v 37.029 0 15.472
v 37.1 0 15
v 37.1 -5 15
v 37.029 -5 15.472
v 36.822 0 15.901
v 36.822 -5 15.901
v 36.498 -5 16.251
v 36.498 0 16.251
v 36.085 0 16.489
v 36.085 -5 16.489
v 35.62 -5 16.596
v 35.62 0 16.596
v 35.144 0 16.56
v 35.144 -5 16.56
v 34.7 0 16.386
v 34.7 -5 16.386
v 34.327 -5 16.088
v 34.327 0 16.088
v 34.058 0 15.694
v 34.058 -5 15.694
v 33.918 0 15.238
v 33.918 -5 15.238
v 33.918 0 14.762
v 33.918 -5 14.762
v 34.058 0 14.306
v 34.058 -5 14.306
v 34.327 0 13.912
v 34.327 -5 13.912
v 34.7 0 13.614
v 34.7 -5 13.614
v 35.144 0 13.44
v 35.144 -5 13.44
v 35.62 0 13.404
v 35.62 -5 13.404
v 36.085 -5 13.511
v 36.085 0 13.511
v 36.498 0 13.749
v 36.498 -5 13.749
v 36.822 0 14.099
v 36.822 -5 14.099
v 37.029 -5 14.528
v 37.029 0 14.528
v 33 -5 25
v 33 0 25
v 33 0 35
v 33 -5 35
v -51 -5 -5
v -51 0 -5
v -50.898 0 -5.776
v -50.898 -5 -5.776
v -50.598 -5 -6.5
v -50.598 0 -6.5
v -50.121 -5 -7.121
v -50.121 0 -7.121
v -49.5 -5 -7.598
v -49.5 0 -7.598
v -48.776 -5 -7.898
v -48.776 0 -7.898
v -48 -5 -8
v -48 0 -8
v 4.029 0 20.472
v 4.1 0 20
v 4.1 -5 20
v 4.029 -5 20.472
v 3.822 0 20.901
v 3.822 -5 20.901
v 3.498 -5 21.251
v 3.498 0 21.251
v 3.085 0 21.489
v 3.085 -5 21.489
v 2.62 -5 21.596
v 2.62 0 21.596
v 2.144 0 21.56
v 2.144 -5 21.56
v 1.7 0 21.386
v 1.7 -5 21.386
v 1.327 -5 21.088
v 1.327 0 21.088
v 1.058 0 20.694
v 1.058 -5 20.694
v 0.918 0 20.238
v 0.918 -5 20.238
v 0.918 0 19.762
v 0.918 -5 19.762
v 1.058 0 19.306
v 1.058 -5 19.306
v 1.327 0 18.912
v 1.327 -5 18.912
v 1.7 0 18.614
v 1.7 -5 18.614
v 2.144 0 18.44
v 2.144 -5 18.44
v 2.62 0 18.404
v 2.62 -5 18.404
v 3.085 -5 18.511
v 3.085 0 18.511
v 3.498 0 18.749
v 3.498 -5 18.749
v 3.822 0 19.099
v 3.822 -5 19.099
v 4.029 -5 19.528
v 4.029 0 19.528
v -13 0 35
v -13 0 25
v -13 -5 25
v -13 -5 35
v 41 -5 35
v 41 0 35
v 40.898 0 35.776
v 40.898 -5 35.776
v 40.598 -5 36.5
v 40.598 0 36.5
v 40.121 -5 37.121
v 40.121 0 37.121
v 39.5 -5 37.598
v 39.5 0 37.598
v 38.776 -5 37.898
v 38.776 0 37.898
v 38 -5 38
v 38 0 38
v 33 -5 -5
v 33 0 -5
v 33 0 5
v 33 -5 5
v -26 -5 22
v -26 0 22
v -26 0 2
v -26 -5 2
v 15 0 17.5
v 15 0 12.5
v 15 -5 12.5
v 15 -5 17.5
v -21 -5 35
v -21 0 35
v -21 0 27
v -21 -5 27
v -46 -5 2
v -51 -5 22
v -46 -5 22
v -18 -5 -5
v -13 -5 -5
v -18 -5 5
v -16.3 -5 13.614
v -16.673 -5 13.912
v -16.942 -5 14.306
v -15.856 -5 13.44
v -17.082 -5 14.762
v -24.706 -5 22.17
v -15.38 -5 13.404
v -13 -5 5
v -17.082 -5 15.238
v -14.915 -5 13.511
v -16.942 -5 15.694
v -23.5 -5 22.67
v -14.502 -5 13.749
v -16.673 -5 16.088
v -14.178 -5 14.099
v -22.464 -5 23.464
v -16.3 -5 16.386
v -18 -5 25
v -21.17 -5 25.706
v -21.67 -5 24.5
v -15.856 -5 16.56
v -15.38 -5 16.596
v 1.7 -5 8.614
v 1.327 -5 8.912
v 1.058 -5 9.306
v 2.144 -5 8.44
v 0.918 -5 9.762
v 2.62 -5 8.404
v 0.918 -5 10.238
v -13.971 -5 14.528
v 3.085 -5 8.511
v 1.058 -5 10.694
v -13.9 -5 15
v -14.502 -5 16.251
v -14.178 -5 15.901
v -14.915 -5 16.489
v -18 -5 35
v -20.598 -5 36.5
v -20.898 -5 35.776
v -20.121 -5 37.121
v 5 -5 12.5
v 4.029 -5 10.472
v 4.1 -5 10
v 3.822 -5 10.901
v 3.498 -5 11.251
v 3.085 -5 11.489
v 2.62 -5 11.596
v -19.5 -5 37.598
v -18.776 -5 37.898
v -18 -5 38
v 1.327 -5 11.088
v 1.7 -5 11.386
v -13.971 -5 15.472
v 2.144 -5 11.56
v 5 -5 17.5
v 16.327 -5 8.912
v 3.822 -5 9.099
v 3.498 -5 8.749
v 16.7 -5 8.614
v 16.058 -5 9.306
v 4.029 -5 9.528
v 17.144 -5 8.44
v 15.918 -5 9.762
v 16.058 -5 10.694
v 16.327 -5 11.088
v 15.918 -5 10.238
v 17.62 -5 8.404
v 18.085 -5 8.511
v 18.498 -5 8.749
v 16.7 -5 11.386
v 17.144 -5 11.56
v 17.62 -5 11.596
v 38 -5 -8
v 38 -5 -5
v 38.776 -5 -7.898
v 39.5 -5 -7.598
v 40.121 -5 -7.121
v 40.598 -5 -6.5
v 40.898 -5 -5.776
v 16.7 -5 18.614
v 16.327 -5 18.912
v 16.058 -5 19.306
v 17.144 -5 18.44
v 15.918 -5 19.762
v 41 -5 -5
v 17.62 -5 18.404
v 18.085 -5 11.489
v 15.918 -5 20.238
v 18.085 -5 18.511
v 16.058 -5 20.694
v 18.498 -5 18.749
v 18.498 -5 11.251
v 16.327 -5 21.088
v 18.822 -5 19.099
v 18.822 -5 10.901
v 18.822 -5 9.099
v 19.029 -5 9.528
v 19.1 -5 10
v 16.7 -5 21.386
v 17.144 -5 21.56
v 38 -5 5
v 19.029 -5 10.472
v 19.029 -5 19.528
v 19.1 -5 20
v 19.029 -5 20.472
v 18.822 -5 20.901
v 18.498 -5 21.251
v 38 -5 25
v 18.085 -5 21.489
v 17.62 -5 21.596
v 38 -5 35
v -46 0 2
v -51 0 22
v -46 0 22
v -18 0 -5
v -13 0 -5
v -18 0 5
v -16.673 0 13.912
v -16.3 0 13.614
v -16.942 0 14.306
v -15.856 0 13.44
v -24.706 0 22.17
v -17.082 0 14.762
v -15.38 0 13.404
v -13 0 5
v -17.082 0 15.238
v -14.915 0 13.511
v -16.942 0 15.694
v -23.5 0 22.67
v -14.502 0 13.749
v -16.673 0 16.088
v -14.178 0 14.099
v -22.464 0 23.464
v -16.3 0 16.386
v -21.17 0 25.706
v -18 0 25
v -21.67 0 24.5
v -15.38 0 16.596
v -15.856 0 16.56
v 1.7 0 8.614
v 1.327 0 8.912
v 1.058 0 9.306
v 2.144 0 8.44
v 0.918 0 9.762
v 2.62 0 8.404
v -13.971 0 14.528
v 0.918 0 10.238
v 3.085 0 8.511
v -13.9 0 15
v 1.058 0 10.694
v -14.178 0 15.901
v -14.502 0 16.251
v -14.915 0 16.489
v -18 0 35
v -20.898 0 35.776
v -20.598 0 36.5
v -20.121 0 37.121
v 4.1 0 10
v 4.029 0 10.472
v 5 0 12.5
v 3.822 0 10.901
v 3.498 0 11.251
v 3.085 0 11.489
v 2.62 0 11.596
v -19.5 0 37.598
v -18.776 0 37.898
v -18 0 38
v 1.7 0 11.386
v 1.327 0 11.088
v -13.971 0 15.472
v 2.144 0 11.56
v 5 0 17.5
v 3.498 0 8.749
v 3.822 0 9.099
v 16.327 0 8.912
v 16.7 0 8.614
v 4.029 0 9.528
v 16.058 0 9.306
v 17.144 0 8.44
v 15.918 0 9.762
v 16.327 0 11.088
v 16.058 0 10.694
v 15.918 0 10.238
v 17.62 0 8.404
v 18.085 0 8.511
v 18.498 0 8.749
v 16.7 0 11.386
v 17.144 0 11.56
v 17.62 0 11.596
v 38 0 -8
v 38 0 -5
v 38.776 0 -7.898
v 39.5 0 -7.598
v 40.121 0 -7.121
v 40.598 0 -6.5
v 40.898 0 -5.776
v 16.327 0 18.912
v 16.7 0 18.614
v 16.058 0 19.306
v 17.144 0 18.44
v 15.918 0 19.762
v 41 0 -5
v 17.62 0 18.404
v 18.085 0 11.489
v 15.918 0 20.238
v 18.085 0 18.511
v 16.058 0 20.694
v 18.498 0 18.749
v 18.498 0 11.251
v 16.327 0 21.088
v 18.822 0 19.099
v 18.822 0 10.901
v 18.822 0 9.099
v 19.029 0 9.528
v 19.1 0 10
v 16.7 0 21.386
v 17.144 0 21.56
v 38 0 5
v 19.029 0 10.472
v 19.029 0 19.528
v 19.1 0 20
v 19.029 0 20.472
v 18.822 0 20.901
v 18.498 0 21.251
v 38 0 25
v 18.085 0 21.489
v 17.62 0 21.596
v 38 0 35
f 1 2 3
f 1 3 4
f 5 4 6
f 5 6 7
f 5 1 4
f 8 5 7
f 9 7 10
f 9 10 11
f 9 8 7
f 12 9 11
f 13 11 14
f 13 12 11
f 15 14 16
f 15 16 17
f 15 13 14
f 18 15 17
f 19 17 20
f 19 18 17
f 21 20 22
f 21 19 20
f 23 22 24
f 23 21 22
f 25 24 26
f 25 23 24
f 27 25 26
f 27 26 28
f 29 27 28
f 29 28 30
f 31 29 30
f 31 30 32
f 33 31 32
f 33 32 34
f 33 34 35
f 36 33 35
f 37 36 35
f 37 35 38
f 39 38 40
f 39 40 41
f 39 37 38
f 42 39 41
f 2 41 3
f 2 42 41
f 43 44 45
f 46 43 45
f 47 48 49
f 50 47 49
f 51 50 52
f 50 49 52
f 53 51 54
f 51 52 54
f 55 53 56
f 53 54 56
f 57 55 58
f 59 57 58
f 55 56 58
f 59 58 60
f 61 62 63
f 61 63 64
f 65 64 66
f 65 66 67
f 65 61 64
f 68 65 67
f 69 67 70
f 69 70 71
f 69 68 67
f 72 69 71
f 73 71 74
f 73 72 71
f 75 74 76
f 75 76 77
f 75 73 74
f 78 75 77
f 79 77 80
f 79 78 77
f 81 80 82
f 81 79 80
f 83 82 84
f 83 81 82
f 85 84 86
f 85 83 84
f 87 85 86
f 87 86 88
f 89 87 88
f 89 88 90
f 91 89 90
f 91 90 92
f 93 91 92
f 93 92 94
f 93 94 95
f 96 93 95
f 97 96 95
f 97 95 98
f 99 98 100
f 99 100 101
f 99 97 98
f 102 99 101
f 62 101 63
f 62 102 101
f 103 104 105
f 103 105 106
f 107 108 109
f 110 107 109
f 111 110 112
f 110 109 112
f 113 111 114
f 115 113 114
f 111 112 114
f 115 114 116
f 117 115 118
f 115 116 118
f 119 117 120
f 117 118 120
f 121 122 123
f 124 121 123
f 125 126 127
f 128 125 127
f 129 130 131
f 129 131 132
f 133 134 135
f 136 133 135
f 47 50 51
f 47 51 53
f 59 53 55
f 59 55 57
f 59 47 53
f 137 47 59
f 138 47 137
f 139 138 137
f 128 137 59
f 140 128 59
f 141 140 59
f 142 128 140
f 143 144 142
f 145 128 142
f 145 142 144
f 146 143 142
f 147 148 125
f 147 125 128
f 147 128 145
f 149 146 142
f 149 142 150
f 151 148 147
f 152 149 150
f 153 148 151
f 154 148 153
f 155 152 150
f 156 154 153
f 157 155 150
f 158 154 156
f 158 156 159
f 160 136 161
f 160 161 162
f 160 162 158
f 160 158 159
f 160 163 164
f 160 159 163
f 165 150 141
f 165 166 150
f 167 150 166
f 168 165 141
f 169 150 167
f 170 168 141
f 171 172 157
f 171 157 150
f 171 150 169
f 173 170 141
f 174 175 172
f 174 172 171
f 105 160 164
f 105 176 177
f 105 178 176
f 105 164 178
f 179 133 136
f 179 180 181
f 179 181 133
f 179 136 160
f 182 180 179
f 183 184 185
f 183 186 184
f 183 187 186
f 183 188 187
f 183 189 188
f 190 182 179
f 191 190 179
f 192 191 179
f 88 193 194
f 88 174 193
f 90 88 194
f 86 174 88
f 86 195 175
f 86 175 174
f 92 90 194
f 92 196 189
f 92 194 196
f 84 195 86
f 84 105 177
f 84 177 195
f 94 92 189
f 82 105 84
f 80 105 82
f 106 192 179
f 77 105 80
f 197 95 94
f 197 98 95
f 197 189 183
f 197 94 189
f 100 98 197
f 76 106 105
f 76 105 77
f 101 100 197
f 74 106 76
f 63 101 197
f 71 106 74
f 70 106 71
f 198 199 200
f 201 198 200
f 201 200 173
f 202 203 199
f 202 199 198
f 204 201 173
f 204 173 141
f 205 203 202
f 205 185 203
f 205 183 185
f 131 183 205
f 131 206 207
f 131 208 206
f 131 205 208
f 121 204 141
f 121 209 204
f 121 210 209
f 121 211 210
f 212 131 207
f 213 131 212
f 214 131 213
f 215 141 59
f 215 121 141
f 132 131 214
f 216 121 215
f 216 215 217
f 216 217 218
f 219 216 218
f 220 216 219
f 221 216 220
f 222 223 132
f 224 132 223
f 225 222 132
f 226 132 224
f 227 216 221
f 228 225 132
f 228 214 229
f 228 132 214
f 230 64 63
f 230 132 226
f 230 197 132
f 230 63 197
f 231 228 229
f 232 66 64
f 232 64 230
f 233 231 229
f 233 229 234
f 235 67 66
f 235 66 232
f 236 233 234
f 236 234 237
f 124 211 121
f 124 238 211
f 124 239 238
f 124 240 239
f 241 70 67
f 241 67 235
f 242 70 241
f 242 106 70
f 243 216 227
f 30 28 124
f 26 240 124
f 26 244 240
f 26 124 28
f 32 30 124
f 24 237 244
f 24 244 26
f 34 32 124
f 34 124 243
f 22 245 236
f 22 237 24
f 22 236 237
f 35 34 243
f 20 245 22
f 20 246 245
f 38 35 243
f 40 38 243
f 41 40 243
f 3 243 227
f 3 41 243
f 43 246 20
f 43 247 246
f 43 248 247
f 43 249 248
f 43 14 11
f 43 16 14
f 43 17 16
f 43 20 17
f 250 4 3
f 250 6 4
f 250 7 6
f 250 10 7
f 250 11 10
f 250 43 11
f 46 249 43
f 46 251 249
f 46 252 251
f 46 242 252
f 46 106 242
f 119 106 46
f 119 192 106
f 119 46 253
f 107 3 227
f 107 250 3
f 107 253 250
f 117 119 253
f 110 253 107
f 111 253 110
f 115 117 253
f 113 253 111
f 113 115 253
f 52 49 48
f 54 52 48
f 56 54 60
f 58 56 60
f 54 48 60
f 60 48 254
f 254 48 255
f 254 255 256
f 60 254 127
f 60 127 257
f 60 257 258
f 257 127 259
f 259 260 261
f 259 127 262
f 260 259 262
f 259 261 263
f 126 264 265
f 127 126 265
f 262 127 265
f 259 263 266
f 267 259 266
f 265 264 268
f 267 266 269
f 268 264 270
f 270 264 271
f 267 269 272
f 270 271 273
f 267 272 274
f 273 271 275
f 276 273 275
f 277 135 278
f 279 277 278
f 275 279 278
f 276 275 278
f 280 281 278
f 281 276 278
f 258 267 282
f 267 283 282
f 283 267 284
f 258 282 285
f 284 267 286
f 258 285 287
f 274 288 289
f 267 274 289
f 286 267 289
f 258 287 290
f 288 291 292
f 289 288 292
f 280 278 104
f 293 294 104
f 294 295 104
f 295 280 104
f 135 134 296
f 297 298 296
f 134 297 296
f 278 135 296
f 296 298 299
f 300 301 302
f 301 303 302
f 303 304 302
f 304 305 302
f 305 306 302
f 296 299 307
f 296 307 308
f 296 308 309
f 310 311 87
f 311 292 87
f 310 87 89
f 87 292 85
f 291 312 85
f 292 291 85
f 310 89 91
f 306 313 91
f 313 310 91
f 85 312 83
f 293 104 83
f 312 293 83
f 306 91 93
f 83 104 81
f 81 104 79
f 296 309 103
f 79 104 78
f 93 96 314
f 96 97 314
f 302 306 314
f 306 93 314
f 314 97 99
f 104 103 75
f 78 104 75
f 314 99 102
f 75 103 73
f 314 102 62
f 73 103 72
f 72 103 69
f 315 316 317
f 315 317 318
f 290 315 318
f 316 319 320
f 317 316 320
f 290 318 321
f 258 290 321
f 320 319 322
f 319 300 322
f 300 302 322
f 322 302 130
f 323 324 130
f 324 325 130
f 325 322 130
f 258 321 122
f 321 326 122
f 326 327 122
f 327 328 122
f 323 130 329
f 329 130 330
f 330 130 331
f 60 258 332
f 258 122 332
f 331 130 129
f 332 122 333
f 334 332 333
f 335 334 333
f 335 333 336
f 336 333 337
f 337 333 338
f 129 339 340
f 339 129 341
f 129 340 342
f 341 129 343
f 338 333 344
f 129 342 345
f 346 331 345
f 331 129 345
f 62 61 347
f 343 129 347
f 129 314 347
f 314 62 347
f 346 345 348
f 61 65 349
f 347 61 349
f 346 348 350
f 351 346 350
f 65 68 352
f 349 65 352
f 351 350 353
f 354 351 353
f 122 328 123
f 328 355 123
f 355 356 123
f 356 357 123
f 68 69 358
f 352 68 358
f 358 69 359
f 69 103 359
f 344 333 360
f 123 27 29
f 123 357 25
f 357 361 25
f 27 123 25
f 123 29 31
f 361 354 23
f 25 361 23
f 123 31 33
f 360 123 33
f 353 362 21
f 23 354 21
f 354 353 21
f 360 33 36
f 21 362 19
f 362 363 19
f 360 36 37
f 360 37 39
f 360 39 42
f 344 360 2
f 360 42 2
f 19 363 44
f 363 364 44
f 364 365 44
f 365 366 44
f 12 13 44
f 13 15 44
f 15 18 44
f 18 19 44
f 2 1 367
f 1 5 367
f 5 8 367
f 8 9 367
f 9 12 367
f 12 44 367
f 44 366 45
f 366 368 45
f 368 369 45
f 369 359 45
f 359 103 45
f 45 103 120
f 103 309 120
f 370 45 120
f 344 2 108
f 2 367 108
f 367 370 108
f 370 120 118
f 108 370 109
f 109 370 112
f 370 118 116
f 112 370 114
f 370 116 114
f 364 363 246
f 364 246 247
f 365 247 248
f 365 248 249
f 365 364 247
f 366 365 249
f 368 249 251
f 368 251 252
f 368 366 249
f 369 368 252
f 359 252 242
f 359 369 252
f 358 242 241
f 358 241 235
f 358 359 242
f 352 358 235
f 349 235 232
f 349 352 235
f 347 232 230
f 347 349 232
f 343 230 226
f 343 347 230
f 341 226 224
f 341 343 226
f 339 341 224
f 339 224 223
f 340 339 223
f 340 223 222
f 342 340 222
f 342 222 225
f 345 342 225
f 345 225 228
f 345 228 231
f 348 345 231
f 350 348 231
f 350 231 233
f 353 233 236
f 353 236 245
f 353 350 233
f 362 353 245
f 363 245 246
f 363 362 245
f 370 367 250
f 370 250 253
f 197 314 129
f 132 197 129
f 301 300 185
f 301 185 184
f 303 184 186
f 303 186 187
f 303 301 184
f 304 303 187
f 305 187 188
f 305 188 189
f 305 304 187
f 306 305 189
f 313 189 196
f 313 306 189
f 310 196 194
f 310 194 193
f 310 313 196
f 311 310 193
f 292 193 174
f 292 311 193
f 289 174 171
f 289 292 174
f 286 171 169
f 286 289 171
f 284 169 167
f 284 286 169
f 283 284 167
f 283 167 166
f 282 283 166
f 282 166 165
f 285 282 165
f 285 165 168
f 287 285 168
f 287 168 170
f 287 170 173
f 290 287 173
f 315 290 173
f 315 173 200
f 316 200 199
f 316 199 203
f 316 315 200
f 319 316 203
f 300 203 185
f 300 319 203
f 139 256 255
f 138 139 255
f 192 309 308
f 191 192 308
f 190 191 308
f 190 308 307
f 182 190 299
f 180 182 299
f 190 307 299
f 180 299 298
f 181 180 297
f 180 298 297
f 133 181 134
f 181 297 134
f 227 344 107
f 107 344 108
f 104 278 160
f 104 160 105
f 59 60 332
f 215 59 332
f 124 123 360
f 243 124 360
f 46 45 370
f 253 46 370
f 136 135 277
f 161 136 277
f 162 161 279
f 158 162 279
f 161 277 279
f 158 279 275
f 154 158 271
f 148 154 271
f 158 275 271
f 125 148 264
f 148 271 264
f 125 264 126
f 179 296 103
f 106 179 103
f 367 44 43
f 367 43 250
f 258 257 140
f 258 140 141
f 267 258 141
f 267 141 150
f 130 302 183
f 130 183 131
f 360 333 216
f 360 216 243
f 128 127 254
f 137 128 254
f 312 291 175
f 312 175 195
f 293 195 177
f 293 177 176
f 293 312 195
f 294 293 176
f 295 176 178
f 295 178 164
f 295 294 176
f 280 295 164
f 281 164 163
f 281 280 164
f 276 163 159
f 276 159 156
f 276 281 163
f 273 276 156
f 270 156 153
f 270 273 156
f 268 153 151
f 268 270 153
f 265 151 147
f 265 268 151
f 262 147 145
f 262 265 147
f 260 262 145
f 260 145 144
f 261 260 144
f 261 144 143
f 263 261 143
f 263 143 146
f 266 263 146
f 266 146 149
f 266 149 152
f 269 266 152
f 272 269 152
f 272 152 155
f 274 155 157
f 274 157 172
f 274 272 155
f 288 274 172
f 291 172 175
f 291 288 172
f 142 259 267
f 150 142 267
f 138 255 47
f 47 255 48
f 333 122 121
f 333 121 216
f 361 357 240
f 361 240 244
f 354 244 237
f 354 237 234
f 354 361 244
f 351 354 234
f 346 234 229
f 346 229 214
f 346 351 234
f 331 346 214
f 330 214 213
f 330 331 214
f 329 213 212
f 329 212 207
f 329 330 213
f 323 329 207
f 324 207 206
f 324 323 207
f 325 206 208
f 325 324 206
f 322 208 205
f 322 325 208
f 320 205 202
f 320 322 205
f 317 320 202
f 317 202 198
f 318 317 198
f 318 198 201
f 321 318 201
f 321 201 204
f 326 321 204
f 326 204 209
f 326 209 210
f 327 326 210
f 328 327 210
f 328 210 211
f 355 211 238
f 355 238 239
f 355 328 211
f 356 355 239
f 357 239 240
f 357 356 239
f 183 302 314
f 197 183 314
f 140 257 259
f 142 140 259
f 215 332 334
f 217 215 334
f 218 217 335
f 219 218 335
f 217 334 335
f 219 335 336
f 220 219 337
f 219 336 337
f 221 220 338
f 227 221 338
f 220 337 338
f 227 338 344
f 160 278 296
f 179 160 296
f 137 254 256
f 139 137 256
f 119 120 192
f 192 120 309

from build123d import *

# Parameters (mm, degrees)
F1_W     = 5
F1_H     = 10
F1_R     = 1.6
F1_W_2   = 10
F1_H_2   = 5
F2_DEPTH = 5


with BuildPart() as f2:
    # F1 (on Front) → F2 (new body)
    with BuildSketch(Plane.XZ):
        with BuildLine():
            Line((-21, 35), (-21, 27))
            ThreePointArc((-21, 27), (-22.4644660941, 23.4644660941), (-26, 22))
            Line((-26, 22), (-26, 2))
            Line((-26, 2), (-46, 2))
            Line((-46, 2), (-46, 22))
            Line((-46, 22), (-51, 22))
            Line((-51, 22), (-51, -5))
            ThreePointArc((-51, -5), (-50.1213203436, -7.1213203436), (-48, -8))
            Line((-48, -8), (38, -8))
            ThreePointArc((38, -8), (40.1213203436, -7.1213203436), (41, -5))
            Line((41, -5), (41, 35))
            ThreePointArc((41, 35), (40.1213203436, 37.1213203436), (38, 38))
            Line((38, 38), (-18, 38))
            ThreePointArc((-18, 38), (-20.1213203436, 37.1213203436), (-21, 35))
        make_face()
        with Locations((-15.5, 0)):
            Rectangle(F1_W, F1_H, mode=Mode.SUBTRACT)
        with Locations((35.5, 0)):
            Rectangle(F1_W, F1_H, mode=Mode.SUBTRACT)
        with Locations((2.5, 10)):
            Circle(F1_R, mode=Mode.SUBTRACT)
        with Locations((17.5, 10)):
            Circle(F1_R, mode=Mode.SUBTRACT)
        with Locations((-15.5, 15)):
            Circle(F1_R, mode=Mode.SUBTRACT)
        with Locations((-15.5, 30)):
            Rectangle(F1_W, F1_H, mode=Mode.SUBTRACT)
        with Locations((2.5, 20)):
            Circle(F1_R, mode=Mode.SUBTRACT)
        with Locations((10, 15)):
            Rectangle(F1_W_2, F1_H_2, mode=Mode.SUBTRACT)
        with Locations((17.5, 20)):
            Circle(F1_R, mode=Mode.SUBTRACT)
        with Locations((35.5, 15)):
            Circle(F1_R, mode=Mode.SUBTRACT)
        with Locations((35.5, 30)):
            Rectangle(F1_W, F1_H, mode=Mode.SUBTRACT)
    extrude(amount=F2_DEPTH)


solid = f2.part
